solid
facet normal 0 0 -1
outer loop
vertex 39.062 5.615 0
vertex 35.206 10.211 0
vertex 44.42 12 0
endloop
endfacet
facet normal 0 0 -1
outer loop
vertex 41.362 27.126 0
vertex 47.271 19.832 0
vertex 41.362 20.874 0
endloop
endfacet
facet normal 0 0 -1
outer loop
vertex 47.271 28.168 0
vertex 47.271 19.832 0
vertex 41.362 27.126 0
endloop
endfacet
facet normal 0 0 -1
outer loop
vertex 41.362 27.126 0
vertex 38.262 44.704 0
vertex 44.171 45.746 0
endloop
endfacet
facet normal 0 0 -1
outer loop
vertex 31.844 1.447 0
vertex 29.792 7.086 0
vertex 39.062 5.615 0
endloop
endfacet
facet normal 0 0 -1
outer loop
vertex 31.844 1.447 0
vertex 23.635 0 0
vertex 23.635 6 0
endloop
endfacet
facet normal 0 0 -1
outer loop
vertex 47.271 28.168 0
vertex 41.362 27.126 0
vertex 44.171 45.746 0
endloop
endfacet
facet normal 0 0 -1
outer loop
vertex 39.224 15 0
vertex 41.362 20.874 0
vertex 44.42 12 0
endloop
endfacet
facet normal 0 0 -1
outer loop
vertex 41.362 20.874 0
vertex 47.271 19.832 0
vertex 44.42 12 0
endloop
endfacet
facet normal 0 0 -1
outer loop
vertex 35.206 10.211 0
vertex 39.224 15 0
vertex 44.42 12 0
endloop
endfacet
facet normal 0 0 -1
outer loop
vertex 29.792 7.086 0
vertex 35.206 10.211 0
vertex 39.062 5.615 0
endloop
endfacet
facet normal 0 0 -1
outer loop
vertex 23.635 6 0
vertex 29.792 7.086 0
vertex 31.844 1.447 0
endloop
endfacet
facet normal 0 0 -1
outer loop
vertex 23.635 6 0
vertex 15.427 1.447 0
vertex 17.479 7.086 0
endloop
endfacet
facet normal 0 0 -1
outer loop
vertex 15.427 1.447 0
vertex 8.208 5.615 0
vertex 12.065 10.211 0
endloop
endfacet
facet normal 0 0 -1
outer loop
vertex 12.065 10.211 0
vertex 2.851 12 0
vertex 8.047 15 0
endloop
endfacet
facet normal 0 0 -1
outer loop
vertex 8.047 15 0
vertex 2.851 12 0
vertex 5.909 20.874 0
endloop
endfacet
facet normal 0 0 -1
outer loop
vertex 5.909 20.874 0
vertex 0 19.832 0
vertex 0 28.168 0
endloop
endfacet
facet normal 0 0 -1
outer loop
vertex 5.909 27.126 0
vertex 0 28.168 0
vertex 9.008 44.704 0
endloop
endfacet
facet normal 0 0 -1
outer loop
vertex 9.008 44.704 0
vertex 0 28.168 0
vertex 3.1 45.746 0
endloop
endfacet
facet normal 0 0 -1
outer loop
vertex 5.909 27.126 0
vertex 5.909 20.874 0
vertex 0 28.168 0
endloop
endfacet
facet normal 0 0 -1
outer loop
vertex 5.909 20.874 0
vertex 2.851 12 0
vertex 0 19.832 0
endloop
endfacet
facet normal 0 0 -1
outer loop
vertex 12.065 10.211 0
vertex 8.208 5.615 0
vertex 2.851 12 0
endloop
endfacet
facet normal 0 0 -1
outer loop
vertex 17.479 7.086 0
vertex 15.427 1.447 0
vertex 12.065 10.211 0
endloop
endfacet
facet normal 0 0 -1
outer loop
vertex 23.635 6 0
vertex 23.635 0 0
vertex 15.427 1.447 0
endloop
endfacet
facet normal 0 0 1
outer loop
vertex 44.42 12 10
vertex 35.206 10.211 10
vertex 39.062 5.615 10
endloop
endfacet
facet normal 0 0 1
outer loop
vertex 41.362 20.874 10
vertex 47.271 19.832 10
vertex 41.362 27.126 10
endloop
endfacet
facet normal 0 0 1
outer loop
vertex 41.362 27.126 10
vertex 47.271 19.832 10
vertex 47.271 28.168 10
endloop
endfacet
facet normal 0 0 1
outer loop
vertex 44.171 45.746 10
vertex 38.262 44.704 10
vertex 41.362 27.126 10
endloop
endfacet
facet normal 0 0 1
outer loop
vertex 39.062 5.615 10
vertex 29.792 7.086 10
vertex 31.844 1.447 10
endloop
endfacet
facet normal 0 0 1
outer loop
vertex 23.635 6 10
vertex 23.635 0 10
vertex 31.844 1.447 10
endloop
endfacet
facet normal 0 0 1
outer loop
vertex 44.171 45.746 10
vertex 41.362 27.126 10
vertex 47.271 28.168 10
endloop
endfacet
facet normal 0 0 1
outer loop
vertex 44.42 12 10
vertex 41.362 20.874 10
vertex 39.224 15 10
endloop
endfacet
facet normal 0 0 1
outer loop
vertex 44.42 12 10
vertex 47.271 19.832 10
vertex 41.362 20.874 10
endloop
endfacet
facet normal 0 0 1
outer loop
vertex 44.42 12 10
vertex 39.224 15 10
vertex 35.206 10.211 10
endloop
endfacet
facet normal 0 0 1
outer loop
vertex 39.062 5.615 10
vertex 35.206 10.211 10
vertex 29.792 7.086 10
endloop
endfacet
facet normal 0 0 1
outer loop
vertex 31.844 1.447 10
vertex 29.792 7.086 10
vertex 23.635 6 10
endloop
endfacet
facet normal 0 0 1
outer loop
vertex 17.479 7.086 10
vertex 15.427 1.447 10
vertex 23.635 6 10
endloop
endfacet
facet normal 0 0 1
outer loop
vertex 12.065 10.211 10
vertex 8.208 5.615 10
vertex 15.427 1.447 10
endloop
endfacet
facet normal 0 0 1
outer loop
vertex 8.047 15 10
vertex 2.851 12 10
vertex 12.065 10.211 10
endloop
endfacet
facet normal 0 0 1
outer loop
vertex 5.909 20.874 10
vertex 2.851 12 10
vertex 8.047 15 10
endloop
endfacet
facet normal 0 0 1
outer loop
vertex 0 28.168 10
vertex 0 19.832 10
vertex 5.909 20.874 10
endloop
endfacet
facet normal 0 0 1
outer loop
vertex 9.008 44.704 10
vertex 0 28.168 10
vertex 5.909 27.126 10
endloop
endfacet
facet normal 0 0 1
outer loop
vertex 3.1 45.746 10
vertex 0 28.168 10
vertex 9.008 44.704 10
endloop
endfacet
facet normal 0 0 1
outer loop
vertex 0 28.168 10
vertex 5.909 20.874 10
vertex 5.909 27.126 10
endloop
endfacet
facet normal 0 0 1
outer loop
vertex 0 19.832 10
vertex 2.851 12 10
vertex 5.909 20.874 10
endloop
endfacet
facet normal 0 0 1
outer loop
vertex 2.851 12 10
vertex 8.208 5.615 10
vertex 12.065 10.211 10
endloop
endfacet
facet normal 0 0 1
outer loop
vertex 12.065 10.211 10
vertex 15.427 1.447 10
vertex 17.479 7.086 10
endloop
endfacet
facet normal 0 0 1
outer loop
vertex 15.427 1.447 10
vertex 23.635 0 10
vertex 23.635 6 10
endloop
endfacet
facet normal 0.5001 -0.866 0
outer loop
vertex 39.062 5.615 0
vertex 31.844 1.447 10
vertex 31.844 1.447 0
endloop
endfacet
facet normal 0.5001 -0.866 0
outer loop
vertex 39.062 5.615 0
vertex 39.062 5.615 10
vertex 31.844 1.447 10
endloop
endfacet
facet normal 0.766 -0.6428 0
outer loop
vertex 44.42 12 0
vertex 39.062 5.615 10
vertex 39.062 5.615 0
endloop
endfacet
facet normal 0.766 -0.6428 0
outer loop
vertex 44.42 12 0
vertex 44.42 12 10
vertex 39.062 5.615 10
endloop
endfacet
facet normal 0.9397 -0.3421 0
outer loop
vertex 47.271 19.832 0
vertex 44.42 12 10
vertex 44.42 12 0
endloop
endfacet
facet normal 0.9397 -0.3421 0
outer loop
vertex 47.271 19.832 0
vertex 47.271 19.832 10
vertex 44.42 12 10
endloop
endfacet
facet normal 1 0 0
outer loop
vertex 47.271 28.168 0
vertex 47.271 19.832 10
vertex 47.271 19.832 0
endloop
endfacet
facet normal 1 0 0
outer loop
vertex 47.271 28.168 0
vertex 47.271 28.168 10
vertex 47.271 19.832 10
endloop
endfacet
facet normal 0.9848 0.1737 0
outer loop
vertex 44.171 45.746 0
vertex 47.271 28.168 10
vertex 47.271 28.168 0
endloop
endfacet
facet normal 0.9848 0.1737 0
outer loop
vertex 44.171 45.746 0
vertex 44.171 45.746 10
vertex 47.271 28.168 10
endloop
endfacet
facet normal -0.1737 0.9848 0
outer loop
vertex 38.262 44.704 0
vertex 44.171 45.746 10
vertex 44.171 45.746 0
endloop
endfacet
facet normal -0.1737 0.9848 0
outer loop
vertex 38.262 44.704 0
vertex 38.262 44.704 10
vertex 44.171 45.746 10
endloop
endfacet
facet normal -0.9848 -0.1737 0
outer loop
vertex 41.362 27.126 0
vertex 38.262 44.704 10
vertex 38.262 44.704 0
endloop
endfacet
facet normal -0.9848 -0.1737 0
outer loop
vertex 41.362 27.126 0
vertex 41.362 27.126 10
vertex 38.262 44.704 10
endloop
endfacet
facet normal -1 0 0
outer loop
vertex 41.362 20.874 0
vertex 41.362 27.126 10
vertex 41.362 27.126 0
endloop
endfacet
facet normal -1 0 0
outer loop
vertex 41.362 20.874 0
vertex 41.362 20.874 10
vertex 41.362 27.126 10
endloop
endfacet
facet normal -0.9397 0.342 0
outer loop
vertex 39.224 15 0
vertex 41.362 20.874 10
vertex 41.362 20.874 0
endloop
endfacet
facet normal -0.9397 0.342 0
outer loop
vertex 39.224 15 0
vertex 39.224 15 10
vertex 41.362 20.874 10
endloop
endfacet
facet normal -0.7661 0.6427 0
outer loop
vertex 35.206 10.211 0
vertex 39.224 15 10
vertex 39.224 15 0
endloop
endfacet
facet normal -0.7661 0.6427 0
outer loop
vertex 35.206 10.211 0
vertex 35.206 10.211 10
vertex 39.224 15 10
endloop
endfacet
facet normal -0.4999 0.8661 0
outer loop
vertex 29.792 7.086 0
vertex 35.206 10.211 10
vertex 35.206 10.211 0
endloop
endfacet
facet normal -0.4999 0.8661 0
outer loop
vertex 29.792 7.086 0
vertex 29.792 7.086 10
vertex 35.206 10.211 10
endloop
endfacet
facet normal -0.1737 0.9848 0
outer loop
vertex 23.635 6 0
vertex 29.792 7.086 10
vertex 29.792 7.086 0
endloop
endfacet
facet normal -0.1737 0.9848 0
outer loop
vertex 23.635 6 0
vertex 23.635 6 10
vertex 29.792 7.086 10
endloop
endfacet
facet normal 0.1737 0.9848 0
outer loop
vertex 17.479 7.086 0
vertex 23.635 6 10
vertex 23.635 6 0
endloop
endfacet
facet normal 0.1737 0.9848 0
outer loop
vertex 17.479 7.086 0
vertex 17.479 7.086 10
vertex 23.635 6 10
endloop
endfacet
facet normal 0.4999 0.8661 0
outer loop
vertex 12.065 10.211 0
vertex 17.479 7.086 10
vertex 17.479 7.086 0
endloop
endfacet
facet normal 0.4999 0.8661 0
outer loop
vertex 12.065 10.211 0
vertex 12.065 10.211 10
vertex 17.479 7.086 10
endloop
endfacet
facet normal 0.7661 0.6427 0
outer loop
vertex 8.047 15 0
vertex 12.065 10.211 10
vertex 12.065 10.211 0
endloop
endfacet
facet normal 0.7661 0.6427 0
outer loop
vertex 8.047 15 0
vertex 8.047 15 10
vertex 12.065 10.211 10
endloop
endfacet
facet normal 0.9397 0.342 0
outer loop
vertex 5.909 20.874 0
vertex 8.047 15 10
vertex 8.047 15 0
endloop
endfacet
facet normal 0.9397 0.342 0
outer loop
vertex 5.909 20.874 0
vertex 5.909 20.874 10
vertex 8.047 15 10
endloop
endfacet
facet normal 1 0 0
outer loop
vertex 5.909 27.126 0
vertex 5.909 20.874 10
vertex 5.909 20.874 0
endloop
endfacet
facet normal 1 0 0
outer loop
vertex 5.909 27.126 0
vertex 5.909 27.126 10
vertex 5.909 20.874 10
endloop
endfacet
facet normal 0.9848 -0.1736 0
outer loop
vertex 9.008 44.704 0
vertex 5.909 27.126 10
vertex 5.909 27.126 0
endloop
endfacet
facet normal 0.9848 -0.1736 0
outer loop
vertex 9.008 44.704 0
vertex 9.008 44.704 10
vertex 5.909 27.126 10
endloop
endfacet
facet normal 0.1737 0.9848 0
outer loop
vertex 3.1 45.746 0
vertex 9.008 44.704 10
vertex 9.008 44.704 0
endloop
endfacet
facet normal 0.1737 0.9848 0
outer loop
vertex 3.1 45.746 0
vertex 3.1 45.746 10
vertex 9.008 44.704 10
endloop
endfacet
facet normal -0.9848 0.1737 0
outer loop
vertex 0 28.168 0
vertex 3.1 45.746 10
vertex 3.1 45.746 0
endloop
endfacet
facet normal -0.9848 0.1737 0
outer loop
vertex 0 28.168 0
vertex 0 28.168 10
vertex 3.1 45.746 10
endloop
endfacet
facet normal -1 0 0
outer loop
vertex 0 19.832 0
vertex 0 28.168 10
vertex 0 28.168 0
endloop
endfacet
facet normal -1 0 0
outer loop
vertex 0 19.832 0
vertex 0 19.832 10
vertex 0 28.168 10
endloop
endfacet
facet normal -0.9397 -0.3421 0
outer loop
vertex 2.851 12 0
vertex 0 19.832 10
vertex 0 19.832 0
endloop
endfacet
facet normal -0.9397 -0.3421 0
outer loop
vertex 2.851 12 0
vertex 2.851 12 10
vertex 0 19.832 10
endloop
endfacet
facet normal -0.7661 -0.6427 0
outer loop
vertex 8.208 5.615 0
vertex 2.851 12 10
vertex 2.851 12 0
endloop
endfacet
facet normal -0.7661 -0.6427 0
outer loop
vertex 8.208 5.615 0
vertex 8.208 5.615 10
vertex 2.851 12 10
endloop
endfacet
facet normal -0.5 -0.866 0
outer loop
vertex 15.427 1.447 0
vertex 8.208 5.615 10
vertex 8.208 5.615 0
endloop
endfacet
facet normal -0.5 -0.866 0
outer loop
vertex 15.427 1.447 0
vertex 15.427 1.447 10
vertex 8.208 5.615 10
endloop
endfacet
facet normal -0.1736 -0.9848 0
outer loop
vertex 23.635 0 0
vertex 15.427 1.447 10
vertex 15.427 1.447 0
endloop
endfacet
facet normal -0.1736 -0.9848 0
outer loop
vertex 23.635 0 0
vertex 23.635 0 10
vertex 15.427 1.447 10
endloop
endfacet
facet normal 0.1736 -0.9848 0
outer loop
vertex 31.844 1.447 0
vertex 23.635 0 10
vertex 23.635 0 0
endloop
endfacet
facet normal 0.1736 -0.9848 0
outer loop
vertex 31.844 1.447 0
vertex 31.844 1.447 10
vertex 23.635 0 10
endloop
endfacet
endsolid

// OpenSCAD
$fn = 32;

// ----------------------------------------------------------------------
// Clip blank: omega clip, 10 mm thick
// ----------------------------------------------------------------------

// --- parameters (mm) ---
profile_height = 10;      // extrusion height
profile_points = 26;      // points of the closed outline

profile = [[0, 28.168], [0, 19.832], [2.851, 12], [8.208, 5.615], [15.427, 1.447], [23.635, 0], [31.844, 1.447], [39.062, 5.615], [44.42, 12], [47.271, 19.832], [47.271, 28.168], [44.171, 45.746], [38.262, 44.704], [41.362, 27.126], [41.362, 20.874], [39.224, 15], [35.206, 10.211], [29.792, 7.086], [23.635, 6], [17.479, 7.086], [12.065, 10.211], [8.047, 15], [5.909, 20.874], [5.909, 27.126], [9.008, 44.704], [3.1, 45.746]];  // single closed polygon, 26 points, counter clockwise

// --- the one profile operation ---
linear_extrude(height = profile_height) polygon(points = profile);
